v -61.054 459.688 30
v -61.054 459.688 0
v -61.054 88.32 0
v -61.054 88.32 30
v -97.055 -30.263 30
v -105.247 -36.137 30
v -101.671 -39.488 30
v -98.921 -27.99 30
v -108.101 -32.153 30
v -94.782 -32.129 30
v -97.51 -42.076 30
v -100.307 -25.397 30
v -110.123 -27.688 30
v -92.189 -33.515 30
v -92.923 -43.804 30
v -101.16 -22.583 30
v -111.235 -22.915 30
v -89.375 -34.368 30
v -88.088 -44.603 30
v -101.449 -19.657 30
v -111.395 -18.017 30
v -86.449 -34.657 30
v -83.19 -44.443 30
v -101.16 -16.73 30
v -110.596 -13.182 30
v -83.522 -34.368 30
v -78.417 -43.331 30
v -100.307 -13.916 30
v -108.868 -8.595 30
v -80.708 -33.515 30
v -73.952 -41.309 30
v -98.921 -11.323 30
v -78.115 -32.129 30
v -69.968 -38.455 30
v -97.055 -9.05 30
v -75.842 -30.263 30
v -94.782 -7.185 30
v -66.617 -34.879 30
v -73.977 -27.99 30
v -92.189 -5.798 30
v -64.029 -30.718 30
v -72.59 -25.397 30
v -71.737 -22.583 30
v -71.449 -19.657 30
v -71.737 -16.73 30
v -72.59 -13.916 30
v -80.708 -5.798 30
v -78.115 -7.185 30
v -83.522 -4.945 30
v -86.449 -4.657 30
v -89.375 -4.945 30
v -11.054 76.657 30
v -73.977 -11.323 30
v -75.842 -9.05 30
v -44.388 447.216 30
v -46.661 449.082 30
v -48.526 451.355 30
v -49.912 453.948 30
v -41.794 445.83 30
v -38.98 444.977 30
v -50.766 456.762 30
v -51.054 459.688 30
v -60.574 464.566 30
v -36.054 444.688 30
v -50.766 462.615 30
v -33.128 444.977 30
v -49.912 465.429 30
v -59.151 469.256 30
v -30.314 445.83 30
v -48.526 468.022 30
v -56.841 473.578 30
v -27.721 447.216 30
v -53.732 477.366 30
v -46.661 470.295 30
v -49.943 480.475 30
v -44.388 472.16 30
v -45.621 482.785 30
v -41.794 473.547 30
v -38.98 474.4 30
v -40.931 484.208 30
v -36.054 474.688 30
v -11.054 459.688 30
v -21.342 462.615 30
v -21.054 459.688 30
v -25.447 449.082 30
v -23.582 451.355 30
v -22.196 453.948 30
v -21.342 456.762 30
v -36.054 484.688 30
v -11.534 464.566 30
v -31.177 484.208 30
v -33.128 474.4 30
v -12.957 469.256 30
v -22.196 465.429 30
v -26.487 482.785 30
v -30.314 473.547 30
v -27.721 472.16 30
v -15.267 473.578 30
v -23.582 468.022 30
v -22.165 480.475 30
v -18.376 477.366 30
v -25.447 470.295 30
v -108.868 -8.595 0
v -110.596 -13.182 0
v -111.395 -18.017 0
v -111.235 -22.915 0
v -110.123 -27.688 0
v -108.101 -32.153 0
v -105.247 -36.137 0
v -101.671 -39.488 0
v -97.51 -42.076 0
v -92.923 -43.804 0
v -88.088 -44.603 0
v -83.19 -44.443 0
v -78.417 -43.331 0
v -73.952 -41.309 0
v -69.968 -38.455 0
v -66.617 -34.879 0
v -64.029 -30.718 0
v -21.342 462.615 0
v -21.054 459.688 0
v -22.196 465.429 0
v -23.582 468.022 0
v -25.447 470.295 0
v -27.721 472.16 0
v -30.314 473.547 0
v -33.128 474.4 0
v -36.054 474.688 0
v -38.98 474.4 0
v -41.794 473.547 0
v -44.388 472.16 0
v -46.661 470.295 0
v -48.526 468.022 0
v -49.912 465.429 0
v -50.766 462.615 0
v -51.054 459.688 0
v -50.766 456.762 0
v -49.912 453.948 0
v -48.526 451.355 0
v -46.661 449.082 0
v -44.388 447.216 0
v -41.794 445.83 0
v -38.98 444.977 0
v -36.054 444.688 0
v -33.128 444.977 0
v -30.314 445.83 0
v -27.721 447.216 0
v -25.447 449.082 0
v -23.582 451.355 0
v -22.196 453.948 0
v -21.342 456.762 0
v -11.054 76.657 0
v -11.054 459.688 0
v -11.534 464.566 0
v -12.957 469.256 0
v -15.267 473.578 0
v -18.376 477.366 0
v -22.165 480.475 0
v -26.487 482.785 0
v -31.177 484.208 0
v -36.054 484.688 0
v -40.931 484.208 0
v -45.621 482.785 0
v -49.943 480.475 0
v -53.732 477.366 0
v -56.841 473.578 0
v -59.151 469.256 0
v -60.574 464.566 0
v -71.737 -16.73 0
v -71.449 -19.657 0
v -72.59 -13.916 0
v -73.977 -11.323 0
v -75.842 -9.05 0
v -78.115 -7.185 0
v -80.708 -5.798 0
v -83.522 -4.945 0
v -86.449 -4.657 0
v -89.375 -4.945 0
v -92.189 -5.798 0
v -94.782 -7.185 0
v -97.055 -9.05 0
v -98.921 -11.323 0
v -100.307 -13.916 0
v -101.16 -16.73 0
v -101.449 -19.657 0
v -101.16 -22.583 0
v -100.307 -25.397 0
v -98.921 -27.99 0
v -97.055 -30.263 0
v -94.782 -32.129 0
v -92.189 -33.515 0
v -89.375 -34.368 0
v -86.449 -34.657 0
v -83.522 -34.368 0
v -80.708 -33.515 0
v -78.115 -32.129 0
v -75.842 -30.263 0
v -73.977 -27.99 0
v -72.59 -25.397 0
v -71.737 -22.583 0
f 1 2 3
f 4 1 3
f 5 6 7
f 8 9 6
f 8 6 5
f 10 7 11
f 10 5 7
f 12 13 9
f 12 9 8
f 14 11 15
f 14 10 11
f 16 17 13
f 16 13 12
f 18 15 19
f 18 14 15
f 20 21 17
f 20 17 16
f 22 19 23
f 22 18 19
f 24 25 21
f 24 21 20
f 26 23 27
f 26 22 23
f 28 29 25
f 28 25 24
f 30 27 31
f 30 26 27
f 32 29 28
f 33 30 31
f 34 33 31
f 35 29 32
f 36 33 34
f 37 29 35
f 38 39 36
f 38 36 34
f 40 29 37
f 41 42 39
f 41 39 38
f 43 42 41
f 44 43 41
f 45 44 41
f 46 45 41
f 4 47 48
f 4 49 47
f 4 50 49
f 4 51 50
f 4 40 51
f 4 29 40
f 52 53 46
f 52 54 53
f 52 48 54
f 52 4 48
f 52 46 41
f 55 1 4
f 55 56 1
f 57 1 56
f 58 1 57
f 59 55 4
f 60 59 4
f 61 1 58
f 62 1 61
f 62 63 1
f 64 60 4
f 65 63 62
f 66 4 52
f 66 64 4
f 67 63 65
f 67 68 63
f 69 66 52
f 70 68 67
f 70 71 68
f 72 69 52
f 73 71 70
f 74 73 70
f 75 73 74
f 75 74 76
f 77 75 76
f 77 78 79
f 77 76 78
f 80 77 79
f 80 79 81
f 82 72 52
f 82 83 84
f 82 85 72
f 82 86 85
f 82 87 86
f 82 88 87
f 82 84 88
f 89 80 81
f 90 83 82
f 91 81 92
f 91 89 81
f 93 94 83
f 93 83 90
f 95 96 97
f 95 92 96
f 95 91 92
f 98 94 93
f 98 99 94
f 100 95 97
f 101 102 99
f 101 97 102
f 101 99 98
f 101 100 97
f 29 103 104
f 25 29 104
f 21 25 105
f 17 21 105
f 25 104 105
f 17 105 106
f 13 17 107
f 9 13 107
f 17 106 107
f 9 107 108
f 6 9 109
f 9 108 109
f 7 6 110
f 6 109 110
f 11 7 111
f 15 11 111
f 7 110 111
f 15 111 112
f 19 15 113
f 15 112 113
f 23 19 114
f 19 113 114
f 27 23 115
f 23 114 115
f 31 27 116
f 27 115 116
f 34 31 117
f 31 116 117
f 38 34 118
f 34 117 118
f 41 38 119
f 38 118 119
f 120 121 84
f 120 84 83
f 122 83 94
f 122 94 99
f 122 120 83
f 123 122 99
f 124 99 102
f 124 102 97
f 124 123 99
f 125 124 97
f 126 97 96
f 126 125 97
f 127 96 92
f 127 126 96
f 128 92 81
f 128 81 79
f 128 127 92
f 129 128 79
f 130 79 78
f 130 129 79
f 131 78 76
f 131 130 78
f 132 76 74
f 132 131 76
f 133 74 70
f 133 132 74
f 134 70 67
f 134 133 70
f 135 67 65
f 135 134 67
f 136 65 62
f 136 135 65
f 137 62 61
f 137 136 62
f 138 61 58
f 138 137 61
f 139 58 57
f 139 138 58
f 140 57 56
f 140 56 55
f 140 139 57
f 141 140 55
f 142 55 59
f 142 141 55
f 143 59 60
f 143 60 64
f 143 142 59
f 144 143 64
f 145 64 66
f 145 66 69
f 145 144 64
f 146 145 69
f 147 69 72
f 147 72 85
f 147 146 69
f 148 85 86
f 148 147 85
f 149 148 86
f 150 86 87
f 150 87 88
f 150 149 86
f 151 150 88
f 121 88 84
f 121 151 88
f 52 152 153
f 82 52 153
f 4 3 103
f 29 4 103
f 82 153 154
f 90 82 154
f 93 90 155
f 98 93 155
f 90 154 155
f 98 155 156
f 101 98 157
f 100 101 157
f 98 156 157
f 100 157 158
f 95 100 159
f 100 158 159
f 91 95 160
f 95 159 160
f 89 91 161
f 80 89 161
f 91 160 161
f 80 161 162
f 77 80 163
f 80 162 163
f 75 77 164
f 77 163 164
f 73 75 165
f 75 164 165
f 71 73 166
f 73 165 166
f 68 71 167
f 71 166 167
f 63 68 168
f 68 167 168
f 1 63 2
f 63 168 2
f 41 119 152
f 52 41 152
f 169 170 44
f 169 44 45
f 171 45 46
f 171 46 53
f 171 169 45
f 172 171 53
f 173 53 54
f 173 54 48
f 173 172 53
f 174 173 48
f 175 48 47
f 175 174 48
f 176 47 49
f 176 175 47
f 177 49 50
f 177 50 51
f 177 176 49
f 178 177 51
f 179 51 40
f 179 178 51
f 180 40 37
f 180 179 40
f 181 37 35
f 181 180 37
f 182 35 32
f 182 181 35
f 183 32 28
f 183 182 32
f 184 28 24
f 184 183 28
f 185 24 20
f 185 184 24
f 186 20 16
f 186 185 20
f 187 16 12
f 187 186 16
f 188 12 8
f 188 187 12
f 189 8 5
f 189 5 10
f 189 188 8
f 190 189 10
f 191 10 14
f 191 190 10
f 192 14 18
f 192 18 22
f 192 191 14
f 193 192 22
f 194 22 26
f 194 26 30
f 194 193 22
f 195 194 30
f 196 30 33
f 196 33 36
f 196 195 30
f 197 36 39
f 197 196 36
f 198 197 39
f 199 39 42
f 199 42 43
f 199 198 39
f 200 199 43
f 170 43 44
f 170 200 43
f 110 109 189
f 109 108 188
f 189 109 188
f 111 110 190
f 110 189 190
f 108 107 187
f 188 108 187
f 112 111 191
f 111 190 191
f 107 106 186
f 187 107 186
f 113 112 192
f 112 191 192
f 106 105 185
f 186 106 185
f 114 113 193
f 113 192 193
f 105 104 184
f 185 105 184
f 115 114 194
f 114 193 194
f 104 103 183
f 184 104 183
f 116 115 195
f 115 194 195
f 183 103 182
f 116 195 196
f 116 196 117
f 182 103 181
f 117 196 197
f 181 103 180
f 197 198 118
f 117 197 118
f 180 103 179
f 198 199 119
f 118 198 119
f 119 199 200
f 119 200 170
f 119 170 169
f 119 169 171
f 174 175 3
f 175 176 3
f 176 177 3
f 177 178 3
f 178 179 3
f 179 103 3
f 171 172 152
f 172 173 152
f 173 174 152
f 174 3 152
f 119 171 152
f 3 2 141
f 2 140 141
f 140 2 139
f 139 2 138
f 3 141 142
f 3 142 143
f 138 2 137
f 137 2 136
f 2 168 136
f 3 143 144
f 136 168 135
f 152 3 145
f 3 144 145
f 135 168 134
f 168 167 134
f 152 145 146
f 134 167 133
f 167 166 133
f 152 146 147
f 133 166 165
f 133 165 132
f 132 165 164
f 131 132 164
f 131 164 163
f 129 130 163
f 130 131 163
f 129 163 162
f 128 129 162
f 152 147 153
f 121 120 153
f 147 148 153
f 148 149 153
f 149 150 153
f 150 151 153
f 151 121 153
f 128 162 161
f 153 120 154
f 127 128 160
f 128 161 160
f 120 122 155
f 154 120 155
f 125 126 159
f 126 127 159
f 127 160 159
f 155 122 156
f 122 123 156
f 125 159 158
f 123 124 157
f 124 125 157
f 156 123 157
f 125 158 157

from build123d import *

# Parameters (mm, degrees)
SKETCH1_R           = 15
BOSS_EXTRUDE1_DEPTH = 30


with BuildPart() as part:
    # Sketch1 → Boss-Extrude1 (new body)
    with BuildSketch(Plane.XY):
        with BuildLine():
            Line((-61.054066009, 459.688422397), (-61.054066009, 88.319905145))
            Line((-61.054066009, 88.319905145), (-108.868464608, -8.595458486))
            ThreePointArc((-108.868464608, -8.595458486), (-97.509706692, -42.076477267), (-64.028687911, -30.717719351))
            Line((-64.028687911, -30.717719351), (-11.054066009, 76.656939649))
            Line((-11.054066009, 76.656939649), (-11.054066009, 459.688422397))
            ThreePointArc((-11.054066009, 459.688422397), (-36.054066009, 484.688422397), (-61.054066009, 459.688422397))
        make_face()
        with Locations((-36.054066009, 459.688422397)):
            Circle(SKETCH1_R, mode=Mode.SUBTRACT)
        with Locations((-86.44857626, -19.656588918)):
            Circle(SKETCH1_R, mode=Mode.SUBTRACT)
    extrude(amount=BOSS_EXTRUDE1_DEPTH)


solid = part.part
